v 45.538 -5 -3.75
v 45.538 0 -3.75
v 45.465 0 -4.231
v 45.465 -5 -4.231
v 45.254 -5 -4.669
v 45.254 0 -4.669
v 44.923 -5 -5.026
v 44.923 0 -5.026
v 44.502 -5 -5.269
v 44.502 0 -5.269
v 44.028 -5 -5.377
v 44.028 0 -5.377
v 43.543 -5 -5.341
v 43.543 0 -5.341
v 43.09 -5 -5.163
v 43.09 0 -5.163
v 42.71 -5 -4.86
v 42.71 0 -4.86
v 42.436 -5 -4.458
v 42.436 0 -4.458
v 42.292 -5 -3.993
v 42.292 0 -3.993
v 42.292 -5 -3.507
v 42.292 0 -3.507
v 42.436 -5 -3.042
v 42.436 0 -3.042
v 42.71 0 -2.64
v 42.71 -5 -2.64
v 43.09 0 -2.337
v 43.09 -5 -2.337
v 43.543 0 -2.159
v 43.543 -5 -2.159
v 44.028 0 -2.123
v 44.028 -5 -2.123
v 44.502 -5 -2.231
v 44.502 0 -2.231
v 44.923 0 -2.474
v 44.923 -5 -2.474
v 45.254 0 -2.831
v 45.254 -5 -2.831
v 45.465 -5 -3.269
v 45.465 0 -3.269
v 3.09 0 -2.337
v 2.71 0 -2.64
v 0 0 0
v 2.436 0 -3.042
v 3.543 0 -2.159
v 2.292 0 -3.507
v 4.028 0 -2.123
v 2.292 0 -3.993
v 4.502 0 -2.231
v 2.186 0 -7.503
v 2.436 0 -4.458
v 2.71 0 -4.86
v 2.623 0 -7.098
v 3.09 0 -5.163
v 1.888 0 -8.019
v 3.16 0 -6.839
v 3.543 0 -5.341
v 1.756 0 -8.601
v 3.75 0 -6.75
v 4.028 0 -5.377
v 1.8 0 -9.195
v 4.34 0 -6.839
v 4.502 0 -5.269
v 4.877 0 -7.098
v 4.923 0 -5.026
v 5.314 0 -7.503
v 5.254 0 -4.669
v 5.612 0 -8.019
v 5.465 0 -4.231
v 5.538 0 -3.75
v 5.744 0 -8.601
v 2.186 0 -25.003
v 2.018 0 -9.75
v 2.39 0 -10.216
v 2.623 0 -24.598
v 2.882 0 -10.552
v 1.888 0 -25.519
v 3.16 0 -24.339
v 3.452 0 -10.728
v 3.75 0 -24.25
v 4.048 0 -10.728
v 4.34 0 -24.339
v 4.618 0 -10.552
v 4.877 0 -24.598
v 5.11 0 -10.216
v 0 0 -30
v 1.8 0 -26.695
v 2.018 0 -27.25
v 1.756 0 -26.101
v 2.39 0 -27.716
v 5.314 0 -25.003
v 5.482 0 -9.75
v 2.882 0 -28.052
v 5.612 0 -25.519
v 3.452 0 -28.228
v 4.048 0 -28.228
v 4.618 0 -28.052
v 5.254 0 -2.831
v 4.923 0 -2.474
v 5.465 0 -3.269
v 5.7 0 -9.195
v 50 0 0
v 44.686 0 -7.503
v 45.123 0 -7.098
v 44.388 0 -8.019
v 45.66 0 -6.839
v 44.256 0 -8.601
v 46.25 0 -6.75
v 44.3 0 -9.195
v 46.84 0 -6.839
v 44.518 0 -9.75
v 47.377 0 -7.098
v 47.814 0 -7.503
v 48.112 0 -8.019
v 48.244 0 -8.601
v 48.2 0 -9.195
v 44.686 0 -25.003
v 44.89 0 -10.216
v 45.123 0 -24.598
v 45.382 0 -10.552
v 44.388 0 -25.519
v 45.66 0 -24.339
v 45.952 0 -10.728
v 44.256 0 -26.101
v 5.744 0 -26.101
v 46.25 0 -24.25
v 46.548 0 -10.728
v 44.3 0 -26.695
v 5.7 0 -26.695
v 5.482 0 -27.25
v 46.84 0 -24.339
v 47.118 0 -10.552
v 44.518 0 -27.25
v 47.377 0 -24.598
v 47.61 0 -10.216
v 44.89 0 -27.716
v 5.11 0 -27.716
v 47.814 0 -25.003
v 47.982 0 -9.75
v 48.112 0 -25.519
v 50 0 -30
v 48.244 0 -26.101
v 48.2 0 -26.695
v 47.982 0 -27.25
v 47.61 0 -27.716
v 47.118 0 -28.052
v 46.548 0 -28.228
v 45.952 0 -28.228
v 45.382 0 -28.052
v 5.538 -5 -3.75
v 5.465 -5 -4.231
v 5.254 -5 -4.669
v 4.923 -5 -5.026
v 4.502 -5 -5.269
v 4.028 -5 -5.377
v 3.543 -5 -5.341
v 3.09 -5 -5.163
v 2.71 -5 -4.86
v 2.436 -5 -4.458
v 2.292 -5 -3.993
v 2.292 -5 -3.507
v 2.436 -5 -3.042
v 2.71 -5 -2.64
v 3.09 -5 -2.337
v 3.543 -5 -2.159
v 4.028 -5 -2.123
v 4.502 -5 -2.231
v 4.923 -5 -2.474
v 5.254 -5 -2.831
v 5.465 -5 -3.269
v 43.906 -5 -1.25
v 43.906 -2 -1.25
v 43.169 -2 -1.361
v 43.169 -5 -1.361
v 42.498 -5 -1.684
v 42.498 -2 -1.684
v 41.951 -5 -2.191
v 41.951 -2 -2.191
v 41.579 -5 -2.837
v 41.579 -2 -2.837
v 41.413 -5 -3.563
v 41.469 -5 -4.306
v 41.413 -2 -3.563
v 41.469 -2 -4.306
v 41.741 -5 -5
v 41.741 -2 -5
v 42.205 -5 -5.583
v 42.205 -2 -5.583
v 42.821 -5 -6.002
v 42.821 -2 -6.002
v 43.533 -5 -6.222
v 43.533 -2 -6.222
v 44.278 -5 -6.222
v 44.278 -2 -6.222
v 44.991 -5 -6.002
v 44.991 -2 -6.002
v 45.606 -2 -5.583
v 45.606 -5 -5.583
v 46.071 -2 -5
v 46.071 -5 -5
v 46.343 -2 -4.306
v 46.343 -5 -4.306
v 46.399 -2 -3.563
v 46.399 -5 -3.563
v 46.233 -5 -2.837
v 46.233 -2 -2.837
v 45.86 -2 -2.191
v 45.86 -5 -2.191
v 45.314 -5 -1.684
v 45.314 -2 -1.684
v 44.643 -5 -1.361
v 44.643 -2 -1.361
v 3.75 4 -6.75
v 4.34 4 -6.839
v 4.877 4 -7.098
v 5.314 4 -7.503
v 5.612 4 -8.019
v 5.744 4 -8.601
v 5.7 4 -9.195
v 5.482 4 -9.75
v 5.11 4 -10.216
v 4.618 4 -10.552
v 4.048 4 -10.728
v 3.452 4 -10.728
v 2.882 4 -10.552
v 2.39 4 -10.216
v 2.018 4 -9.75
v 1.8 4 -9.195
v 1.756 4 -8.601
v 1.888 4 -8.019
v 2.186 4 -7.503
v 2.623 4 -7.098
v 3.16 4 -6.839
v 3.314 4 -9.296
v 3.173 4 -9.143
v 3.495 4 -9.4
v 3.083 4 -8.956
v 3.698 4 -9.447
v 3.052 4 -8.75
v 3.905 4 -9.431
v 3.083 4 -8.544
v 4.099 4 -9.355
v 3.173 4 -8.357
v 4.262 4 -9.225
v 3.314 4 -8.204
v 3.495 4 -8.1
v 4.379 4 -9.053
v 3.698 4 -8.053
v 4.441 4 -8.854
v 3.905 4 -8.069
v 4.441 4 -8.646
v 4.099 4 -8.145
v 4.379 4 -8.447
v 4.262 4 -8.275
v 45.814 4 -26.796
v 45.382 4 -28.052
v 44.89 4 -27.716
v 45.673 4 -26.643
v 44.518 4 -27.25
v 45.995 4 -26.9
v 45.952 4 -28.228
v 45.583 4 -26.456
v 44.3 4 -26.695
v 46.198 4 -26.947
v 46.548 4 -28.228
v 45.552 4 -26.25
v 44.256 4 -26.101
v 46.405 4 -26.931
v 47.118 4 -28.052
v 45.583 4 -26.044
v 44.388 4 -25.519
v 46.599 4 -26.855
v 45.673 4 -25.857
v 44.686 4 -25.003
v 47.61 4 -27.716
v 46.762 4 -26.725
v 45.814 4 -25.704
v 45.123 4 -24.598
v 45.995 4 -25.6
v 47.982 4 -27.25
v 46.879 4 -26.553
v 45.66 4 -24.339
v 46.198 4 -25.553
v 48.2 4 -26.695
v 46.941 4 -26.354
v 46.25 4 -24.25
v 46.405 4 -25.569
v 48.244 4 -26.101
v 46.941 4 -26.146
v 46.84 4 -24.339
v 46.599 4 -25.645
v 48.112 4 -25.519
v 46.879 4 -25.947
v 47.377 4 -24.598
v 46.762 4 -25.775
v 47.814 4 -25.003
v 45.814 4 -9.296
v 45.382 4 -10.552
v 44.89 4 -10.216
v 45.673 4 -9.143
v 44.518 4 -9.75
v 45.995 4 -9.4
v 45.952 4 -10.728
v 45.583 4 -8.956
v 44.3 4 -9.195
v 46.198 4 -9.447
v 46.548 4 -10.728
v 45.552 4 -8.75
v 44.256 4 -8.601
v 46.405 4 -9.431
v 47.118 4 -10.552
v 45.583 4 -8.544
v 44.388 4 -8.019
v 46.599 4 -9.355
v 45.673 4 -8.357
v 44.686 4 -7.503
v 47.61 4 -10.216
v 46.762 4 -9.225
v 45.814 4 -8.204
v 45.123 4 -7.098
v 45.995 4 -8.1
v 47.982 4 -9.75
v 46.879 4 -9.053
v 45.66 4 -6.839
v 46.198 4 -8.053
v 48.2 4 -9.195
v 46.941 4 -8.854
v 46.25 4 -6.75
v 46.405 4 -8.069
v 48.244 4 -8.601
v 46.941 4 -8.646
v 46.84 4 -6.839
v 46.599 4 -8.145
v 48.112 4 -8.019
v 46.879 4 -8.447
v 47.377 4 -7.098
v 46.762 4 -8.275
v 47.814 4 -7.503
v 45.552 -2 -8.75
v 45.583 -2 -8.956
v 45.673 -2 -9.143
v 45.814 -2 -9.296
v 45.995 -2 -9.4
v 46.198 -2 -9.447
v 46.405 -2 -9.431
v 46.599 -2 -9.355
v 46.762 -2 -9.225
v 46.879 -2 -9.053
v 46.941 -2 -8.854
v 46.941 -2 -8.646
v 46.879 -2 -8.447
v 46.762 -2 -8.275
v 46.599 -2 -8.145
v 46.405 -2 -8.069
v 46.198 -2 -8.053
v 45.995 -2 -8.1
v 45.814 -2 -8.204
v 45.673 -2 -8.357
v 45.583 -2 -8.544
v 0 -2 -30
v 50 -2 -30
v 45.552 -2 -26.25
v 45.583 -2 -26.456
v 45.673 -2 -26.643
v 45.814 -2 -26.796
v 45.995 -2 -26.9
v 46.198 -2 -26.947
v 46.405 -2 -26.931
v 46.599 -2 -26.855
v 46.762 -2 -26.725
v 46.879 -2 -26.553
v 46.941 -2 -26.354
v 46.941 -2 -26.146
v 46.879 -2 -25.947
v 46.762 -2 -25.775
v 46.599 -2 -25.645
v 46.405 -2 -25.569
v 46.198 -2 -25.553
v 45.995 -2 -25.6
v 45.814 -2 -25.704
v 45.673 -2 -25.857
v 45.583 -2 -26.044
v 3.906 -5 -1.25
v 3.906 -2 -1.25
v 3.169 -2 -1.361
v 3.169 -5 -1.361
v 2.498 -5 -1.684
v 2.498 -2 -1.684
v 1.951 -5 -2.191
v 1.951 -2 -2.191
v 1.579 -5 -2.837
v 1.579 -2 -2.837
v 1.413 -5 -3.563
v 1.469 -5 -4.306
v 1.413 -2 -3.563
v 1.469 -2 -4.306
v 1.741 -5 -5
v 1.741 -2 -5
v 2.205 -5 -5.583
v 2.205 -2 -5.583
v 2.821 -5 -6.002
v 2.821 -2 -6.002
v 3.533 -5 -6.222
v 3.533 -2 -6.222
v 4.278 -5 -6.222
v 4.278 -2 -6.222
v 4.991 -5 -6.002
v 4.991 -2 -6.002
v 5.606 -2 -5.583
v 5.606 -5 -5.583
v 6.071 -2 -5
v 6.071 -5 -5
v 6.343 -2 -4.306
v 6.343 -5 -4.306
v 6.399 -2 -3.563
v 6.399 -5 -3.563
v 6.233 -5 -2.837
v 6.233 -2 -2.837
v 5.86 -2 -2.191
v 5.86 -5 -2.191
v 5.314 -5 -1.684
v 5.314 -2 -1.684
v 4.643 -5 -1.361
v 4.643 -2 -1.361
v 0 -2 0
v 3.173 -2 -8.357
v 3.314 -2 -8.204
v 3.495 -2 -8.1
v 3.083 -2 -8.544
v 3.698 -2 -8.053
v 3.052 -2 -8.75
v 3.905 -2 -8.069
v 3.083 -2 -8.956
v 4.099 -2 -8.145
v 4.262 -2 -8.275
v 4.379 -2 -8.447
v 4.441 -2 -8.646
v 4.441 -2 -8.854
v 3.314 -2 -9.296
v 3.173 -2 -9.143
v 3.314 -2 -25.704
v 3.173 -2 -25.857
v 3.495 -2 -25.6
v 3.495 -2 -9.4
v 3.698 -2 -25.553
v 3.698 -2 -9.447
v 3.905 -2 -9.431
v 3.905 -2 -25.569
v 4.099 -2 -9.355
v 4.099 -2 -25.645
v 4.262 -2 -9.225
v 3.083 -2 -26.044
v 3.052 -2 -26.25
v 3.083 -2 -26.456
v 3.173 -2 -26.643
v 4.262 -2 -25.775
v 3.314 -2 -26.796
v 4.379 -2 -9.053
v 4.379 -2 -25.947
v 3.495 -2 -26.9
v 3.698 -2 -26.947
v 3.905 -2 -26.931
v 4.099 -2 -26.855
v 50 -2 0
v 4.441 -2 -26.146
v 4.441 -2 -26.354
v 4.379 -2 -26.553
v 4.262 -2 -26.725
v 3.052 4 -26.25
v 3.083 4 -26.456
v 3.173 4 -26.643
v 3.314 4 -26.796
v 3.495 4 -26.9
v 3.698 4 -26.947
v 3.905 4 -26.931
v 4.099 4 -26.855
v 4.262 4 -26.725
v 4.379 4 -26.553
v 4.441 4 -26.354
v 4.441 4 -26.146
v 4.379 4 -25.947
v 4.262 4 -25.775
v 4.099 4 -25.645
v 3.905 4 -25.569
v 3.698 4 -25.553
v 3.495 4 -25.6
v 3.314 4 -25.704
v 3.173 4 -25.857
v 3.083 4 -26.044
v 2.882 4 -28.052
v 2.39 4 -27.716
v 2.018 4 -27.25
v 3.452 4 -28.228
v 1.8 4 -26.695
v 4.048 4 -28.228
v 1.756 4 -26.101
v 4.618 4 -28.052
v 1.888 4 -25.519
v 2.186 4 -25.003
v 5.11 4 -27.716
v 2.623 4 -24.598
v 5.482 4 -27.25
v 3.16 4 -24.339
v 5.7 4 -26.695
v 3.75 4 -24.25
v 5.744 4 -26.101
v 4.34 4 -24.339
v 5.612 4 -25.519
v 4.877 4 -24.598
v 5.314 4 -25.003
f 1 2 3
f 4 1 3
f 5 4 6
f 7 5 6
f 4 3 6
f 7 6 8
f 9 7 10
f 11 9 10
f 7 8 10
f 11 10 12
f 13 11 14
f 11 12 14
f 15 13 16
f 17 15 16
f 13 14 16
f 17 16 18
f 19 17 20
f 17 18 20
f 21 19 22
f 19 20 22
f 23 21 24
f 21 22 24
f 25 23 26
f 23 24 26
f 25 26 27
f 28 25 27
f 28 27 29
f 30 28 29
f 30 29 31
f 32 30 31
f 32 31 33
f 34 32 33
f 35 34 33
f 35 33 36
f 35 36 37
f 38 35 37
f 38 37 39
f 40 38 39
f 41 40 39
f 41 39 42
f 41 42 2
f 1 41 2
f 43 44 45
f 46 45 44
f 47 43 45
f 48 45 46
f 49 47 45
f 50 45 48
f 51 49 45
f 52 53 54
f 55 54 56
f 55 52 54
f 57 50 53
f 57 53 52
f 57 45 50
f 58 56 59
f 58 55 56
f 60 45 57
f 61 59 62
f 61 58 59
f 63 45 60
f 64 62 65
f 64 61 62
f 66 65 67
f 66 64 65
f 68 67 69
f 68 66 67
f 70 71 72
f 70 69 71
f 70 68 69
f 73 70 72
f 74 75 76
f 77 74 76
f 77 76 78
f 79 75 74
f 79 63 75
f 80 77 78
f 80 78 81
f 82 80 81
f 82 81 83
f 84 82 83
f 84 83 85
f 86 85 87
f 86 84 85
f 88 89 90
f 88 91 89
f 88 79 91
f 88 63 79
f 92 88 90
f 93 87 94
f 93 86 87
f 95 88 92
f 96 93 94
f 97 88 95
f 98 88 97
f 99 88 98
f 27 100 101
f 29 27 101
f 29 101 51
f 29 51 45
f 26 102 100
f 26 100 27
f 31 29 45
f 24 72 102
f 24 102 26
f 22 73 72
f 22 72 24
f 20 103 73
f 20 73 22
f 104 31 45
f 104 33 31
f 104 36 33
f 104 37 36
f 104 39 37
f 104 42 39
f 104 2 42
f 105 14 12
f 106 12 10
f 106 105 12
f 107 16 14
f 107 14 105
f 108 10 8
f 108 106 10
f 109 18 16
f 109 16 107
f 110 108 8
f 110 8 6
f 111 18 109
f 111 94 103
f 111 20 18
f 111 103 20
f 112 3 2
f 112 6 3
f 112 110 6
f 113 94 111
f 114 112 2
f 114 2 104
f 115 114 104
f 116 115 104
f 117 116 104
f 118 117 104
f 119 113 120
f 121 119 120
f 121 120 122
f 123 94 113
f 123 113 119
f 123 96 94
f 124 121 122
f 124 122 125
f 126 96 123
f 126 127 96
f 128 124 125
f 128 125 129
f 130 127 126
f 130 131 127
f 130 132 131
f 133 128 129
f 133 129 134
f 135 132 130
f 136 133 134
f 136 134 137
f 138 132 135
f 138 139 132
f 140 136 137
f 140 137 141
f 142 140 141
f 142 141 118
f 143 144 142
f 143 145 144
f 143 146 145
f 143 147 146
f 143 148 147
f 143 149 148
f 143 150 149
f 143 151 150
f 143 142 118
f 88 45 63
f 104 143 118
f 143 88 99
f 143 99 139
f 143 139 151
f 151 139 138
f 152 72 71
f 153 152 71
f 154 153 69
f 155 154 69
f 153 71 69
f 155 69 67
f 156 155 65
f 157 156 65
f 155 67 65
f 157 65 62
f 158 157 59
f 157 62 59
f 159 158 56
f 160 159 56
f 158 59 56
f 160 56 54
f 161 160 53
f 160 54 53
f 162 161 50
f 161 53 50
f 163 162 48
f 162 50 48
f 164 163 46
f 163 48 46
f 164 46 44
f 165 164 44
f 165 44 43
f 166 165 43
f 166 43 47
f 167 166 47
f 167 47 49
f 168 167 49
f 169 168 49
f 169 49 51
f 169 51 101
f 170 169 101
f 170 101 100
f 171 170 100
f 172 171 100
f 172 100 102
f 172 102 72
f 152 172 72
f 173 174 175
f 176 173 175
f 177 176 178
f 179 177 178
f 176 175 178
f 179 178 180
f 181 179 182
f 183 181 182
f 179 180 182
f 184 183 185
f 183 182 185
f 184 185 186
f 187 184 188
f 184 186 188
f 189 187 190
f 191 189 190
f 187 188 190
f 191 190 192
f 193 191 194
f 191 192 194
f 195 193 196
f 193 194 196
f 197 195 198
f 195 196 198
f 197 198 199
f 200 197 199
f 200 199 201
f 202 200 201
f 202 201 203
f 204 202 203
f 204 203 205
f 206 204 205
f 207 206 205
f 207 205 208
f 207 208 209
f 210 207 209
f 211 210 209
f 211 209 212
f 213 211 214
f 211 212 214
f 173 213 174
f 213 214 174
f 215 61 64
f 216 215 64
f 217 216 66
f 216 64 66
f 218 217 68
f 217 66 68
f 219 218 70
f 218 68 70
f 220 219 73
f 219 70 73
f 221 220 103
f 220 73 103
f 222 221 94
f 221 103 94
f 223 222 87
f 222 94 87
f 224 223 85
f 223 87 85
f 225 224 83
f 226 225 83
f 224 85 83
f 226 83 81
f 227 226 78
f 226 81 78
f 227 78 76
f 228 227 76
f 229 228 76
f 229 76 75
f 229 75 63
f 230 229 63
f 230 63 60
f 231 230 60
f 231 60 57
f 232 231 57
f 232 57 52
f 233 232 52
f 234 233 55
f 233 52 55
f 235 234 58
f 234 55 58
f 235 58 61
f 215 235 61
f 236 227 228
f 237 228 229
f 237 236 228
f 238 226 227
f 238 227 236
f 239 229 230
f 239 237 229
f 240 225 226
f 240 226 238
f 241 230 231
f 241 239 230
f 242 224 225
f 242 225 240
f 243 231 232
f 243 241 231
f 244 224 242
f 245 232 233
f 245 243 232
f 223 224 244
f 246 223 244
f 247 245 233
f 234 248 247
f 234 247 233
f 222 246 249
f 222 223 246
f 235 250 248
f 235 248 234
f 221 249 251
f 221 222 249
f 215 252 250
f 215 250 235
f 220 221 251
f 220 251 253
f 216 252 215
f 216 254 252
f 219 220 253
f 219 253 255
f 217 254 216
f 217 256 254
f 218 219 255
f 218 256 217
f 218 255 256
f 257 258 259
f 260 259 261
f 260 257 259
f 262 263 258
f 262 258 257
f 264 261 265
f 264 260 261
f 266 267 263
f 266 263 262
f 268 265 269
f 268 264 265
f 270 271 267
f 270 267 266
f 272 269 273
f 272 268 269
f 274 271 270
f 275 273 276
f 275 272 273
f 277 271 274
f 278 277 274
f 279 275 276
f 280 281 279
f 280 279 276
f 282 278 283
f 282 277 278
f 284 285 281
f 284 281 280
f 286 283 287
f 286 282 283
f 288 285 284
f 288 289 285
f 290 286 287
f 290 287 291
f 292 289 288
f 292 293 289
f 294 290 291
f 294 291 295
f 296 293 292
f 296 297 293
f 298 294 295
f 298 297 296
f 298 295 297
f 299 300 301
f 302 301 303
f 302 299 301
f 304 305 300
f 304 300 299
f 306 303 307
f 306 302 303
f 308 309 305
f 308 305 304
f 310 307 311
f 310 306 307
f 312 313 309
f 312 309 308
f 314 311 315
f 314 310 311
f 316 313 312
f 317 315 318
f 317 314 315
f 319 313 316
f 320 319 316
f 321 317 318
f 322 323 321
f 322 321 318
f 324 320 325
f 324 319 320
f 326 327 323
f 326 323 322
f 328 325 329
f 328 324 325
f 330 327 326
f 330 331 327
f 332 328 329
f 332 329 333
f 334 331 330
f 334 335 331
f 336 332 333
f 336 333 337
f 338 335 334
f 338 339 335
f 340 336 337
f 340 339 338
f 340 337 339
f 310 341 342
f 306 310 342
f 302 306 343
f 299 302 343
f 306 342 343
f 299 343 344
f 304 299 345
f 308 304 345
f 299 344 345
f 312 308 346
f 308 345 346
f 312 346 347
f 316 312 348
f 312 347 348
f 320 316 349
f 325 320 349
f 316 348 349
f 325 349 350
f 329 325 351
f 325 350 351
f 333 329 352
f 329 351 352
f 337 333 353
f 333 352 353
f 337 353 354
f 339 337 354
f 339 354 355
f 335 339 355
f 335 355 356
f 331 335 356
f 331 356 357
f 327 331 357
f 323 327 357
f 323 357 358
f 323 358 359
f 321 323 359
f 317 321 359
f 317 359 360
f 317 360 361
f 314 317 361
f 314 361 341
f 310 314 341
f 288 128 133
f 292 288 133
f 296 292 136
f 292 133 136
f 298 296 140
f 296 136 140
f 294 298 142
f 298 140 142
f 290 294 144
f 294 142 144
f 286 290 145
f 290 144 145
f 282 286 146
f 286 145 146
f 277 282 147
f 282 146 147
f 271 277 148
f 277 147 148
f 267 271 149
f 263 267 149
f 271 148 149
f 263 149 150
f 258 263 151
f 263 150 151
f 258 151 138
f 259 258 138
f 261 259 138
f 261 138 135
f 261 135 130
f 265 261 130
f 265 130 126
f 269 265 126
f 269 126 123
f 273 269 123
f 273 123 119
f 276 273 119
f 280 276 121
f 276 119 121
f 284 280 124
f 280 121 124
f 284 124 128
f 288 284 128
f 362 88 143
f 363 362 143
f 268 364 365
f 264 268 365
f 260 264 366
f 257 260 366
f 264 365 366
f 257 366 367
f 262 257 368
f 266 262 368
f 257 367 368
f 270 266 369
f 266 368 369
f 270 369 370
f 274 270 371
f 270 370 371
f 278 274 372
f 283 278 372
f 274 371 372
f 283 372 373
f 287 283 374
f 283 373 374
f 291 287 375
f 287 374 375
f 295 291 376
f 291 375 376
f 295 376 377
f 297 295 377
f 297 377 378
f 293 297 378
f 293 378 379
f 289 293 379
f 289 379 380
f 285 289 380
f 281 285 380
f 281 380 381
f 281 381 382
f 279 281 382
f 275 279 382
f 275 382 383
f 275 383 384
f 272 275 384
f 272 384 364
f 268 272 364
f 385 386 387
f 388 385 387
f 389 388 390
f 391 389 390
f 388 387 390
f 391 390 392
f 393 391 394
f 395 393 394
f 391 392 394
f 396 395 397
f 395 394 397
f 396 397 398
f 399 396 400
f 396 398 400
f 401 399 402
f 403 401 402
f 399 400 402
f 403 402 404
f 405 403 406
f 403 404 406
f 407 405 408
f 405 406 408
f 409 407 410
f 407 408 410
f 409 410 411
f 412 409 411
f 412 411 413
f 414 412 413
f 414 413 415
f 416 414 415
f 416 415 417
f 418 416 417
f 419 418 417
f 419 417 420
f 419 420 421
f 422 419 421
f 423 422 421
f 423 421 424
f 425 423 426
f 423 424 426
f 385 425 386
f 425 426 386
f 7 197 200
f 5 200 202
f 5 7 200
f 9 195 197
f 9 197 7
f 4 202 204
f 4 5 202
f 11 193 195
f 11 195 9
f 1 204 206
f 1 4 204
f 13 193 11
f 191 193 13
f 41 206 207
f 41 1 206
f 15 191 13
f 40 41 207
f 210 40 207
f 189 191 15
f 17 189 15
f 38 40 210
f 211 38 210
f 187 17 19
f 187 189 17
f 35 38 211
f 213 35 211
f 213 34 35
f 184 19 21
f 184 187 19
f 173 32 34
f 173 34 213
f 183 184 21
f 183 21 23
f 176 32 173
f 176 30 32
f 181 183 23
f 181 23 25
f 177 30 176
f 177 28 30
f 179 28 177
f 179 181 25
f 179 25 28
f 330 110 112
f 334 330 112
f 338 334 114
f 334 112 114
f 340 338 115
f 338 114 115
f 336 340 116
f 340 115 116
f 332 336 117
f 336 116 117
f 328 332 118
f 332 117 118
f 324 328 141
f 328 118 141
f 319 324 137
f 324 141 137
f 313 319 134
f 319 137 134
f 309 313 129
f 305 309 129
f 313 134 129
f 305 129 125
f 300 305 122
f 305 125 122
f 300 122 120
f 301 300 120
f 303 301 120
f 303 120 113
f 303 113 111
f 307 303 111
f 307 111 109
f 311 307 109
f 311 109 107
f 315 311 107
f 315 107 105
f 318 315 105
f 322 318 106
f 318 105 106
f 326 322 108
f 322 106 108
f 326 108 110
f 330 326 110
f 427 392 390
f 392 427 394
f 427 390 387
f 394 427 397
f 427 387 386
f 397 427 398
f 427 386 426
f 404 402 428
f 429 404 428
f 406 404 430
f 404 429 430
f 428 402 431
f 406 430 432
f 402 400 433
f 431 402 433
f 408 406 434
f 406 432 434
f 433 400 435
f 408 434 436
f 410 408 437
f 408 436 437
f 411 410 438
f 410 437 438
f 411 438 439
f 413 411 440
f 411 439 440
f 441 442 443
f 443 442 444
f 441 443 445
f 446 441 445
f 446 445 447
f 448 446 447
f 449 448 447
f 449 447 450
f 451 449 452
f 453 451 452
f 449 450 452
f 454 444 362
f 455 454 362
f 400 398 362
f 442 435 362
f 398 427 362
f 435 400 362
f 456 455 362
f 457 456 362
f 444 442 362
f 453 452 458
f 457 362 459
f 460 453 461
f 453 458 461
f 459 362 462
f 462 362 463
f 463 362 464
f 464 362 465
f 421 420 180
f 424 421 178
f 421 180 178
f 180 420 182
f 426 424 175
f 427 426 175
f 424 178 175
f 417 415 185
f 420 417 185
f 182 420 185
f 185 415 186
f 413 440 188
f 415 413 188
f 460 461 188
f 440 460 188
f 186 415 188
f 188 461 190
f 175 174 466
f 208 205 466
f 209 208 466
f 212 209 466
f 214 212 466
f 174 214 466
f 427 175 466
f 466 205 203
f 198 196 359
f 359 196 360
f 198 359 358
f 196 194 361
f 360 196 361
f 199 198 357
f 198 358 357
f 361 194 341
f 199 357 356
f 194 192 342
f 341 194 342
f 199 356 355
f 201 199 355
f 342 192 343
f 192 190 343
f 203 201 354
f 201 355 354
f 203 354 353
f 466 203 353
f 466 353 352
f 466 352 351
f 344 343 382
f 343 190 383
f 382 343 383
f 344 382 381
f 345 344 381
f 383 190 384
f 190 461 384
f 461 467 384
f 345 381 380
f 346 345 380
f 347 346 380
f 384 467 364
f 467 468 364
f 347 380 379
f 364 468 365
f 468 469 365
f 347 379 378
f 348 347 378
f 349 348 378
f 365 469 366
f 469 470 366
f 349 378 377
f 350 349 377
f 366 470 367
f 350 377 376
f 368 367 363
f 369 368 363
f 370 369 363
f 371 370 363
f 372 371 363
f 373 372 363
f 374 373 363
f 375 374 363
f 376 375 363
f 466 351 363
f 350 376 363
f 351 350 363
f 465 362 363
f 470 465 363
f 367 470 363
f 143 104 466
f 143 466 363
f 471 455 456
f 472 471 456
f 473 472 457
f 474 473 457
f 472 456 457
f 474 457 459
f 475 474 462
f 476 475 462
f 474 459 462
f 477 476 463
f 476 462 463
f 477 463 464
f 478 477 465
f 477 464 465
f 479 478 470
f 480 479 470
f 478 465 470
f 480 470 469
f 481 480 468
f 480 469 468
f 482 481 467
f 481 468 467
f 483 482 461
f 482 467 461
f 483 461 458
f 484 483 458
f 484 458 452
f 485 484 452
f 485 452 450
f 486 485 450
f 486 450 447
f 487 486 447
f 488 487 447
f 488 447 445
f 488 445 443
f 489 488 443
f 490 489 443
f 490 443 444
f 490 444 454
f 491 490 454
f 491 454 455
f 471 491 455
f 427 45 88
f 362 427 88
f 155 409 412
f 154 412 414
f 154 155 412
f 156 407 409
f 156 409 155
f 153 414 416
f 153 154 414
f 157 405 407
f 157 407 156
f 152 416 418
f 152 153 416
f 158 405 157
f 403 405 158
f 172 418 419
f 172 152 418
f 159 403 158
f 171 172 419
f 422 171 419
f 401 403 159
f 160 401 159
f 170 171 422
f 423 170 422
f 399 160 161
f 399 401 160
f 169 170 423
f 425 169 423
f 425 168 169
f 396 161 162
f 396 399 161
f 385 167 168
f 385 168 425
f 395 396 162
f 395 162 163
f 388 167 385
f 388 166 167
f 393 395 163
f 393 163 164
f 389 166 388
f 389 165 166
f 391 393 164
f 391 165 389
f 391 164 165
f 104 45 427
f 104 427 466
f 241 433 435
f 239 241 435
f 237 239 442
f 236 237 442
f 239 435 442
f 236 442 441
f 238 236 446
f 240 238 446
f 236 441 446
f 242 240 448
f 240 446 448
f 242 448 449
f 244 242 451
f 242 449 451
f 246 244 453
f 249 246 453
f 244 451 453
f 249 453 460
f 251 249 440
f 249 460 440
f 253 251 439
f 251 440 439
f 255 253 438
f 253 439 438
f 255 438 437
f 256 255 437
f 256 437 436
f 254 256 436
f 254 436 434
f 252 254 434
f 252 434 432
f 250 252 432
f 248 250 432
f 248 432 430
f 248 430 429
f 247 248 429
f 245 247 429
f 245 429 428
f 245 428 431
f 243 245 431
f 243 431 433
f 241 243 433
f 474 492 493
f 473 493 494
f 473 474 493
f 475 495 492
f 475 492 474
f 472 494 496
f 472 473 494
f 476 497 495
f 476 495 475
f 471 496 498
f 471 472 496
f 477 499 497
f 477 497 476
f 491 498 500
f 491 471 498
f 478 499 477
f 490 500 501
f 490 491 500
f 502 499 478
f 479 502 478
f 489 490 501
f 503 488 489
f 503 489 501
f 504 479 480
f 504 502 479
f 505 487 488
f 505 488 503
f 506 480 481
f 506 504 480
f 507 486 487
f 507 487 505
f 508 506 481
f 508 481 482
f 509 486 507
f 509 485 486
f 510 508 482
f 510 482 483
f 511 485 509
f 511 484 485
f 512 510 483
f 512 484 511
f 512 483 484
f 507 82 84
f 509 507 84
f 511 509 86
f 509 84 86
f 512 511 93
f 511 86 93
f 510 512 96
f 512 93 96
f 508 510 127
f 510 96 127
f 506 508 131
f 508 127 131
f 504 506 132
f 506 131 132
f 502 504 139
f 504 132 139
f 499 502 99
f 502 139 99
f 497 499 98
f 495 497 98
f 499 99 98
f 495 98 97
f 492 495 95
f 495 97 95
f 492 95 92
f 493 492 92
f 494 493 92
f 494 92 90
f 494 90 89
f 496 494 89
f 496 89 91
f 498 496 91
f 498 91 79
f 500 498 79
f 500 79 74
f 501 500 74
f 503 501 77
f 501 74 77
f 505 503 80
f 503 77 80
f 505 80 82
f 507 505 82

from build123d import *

# Parameters (mm, degrees)
SKETCH1_R              = 2
BOSS_EXTRUDE1_DEPTH    = 4
BOSS_EXTRUDE1_2_DEPTH  = 4
BOSS_EXTRUDE1_3_DEPTH  = 4
BOSS_EXTRUDE1_4_DEPTH  = 4
SKETCH2_W              = 50
SKETCH2_H              = 30
BOSS_EXTRUDE2_DEPTH    = 2
F_00_CLEARANCE_HOLE2_D = 1.397
SKETCH9_R              = 2.5
BOSS_EXTRUDE3_DEPTH    = 3
F_4_CLEARANCE_HOLE1_D  = 3.2639


with BuildPart() as part:
    # Sketch1 → Boss-Extrude1 (new body)
    with BuildSketch(Plane(origin=(0, 0, 0), x_dir=(1, 0, 0), z_dir=(0, 1, 0))):
        with Locations(Location((3.75, 26.25, 0), (0, 0, 270))):
            Circle(SKETCH1_R)
    extrude(amount=BOSS_EXTRUDE1_DEPTH)



with BuildPart() as body_2:
    # Sketch1 → Boss-Extrude1 2 (new body)
    with BuildSketch(Plane(origin=(0, 0, 0), x_dir=(1, 0, 0), z_dir=(0, 1, 0))):
        with Locations(Location((46.25, 26.25, 0), (0, 0, 270))):
            Circle(SKETCH1_R)
    extrude(amount=BOSS_EXTRUDE1_2_DEPTH)


with BuildPart() as body_3:
    # Sketch1 → Boss-Extrude1 3 (new body)
    with BuildSketch(Plane(origin=(0, 0, 0), x_dir=(1, 0, 0), z_dir=(0, 1, 0))):
        with Locations(Location((46.25, 8.75, 0), (0, 0, 270))):
            Circle(SKETCH1_R)
    extrude(amount=BOSS_EXTRUDE1_3_DEPTH)


with BuildPart() as body_4:
    # Sketch1 → Boss-Extrude1 4 (new body)
    with BuildSketch(Plane(origin=(0, 0, 0), x_dir=(1, 0, 0), z_dir=(0, 1, 0))):
        with Locations(Location((3.75, 8.75, 0), (0, 0, 270))):
            Circle(SKETCH1_R)
    extrude(amount=BOSS_EXTRUDE1_4_DEPTH)


with BuildPart() as part_1:
    add(part.part)

    add(body_2.part)  # Boss-Extrude2 merges body 2

    add(body_3.part)  # Boss-Extrude2 merges body 3

    add(body_4.part)  # Boss-Extrude2 merges body 4
    # Sketch2 → Boss-Extrude2 (add)
    with BuildSketch(Plane(origin=(0, 0, 0), x_dir=(1, 0, 0), z_dir=(0, 1, 0))):
        with Locations((25, 15)):
            Rectangle(SKETCH2_W, SKETCH2_H)
    extrude(amount=-BOSS_EXTRUDE2_DEPTH)

    # #00 Clearance Hole2 (through all)
    with Locations(Plane(origin=(0, 4, 0), x_dir=(1, 0, 0), z_dir=(0, 1, 0))):
        with Locations((3.75, 26.25), (46.25, 26.25), (46.25, 8.75), (3.75, 8.75)):
            Hole(F_00_CLEARANCE_HOLE2_D / 2)

    # Sketch9 → Boss-Extrude3 (add)
    with BuildSketch(Plane.XZ.offset(2)):
        with Locations(Location((3.905878753, -3.75, 0), (0, 0, 90))):
            Circle(SKETCH9_R)
        with Locations(Location((43.905878753, -3.75, 0), (0, 0, 90))):
            Circle(SKETCH9_R)
    extrude(amount=BOSS_EXTRUDE3_DEPTH)

    # #4 Clearance Hole1 (through all)
    with Locations(Plane(origin=(0, -5, 0), x_dir=(-1, 0, 0), z_dir=(0, -1, 0))):
        with Locations((-3.905878753, 3.75), (-43.905878753, 3.75)):
            Hole(F_4_CLEARANCE_HOLE1_D / 2)


solid = part_1.part
